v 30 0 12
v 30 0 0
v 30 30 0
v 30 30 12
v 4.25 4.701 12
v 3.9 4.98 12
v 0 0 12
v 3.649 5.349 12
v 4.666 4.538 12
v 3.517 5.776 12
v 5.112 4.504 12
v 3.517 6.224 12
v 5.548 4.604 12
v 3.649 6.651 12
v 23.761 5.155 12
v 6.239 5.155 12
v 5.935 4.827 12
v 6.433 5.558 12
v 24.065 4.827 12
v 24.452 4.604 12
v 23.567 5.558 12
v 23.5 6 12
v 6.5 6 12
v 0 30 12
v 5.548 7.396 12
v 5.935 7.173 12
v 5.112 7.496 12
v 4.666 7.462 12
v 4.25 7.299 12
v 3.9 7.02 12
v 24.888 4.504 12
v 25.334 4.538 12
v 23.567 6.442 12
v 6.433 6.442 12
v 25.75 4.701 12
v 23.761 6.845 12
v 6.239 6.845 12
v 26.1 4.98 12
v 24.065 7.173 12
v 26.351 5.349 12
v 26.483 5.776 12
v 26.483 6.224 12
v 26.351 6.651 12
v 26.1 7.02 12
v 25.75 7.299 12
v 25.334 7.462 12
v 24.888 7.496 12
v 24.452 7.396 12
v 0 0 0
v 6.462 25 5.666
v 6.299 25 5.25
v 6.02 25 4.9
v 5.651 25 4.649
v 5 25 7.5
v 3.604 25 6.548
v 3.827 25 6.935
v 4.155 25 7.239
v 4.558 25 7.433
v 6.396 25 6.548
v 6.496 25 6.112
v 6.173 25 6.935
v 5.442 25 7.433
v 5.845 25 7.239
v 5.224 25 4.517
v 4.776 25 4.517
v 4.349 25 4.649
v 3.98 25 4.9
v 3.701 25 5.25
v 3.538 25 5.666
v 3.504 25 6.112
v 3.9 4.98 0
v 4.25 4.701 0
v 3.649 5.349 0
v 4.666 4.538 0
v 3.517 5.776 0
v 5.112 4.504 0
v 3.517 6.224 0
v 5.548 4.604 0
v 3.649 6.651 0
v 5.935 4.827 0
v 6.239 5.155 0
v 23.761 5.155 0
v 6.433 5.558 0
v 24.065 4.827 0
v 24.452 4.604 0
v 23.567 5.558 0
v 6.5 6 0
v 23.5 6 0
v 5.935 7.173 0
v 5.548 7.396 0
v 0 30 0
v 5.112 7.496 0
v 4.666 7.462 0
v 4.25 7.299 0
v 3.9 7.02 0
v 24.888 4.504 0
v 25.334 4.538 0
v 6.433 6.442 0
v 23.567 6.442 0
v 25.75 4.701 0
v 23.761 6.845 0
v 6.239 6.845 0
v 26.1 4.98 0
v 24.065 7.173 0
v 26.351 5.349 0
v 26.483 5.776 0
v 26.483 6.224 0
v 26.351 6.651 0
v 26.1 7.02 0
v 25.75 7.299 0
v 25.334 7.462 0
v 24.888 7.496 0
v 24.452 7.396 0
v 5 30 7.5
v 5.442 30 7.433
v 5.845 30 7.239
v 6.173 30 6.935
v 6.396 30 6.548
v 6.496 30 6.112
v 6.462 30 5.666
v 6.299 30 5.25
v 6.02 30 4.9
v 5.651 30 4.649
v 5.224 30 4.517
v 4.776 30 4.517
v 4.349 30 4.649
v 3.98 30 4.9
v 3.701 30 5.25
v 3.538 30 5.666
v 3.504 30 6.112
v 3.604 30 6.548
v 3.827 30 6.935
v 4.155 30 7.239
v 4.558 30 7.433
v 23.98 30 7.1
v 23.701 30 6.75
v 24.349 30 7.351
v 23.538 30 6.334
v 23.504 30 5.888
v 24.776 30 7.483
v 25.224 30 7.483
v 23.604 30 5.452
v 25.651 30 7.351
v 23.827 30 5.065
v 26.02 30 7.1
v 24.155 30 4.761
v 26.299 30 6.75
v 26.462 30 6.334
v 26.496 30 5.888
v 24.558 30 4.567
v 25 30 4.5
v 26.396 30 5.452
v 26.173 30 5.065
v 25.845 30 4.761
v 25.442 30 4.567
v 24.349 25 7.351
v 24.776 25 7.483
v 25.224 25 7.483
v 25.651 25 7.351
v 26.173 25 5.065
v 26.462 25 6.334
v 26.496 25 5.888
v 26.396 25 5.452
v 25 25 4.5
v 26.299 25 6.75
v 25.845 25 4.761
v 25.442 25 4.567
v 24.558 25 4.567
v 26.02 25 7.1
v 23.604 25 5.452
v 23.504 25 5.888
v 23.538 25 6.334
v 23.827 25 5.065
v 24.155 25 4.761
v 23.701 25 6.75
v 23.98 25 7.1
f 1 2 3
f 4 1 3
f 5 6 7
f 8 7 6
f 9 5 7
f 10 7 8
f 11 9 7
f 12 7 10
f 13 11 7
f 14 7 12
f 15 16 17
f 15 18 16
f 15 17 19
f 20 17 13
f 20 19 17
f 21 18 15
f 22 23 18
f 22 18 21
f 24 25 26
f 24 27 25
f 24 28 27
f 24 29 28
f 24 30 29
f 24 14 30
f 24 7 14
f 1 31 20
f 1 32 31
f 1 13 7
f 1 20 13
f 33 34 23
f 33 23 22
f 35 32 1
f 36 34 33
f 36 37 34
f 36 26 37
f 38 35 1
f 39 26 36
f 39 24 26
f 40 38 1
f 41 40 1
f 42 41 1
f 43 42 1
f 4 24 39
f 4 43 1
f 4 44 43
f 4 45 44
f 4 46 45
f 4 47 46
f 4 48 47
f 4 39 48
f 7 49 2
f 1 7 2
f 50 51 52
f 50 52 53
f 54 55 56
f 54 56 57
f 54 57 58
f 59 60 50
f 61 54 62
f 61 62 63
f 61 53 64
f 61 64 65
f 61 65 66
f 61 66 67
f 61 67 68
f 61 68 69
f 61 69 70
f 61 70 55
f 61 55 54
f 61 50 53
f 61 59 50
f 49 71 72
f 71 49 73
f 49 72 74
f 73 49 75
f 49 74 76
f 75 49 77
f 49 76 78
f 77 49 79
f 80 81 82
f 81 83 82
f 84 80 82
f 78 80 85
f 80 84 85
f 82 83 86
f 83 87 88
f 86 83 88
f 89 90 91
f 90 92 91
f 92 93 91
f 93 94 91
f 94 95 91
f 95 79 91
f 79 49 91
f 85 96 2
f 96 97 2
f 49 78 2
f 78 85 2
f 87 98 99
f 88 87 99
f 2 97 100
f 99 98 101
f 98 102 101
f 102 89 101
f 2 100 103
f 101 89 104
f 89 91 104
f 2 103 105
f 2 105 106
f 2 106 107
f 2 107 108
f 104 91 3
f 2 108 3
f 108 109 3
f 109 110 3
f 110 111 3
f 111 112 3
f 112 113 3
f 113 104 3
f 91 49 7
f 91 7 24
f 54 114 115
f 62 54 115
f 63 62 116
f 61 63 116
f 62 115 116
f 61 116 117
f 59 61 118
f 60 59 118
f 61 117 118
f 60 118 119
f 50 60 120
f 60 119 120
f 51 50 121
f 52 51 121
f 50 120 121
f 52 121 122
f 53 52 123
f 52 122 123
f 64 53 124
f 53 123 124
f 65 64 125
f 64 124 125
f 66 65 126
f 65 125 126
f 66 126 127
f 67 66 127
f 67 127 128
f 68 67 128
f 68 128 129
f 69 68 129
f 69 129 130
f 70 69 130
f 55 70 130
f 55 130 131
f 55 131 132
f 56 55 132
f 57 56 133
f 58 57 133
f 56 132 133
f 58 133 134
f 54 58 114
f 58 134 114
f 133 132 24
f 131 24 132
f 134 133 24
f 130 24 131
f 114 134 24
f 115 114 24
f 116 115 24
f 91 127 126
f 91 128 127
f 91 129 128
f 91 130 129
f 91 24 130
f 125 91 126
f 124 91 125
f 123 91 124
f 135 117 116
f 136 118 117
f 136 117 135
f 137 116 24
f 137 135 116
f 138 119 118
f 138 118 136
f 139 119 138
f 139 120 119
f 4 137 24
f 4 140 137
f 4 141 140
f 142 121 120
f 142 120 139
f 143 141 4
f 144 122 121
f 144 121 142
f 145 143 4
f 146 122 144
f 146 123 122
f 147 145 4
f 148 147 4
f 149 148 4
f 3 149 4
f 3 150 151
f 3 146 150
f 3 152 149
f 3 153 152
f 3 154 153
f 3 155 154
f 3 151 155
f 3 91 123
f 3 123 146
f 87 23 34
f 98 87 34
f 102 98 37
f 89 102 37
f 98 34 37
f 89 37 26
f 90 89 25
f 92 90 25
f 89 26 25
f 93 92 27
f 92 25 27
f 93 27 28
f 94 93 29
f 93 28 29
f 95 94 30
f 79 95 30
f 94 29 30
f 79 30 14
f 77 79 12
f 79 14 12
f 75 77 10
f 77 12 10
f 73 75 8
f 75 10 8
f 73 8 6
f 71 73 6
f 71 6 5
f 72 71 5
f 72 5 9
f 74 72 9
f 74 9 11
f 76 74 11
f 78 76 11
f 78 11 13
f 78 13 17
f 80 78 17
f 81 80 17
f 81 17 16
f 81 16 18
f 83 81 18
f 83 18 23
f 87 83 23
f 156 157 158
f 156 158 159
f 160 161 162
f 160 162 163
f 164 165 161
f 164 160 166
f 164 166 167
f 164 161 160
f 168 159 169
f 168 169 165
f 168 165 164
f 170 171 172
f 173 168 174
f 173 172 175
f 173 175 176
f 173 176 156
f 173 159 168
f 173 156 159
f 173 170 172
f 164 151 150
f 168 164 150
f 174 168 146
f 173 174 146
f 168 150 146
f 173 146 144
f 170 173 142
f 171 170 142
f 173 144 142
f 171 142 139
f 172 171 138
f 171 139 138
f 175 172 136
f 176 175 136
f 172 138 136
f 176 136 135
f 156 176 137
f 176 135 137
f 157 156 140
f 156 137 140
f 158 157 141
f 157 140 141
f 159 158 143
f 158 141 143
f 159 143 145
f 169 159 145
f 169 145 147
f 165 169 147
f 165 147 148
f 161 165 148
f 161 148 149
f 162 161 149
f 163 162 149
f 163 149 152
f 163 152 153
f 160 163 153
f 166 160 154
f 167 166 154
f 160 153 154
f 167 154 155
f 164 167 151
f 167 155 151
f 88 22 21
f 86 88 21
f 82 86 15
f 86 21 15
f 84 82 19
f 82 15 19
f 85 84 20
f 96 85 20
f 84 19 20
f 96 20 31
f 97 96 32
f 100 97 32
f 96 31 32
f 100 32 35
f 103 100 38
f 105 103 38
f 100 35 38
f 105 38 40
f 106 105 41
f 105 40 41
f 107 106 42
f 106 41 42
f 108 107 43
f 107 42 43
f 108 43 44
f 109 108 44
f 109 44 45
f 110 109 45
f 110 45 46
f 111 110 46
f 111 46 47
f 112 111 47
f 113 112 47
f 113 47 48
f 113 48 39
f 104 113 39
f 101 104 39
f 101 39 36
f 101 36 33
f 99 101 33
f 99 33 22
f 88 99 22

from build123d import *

# Parameters (mm, degrees)
SKETCH1_W           = 30
SKETCH1_H           = 30
BOSS_EXTRUDE1_DEPTH = 12
SKETCH2_R           = 1.5
CUT_EXTRUDE1_DEPTH  = 45.09081537
SKETCH3_R           = 1.5
CUT_EXTRUDE2_DEPTH  = 5


with BuildPart() as part:
    # Sketch1 → Boss-Extrude1 (new body)
    with BuildSketch(Plane.XY):
        with Locations((15, 15)):
            Rectangle(SKETCH1_W, SKETCH1_H)
    extrude(amount=BOSS_EXTRUDE1_DEPTH)

    # Sketch2 → Cut-Extrude1 (cut, through all)
    with BuildSketch(Plane.XY.offset(12)):
        with Locations((5, 6)):
            Circle(SKETCH2_R)
        with Locations(Location((25, 6, 0), (0, 0, 180))):
            Circle(SKETCH2_R)
    extrude(amount=-CUT_EXTRUDE1_DEPTH, mode=Mode.SUBTRACT)

    # Sketch3 → Cut-Extrude2 (cut)
    with BuildSketch(Plane(origin=(0, 30, 0), x_dir=(1, 0, 0), z_dir=(0, 1, 0))):
        with Locations(Location((5, -6, 0), (0, 0, 270))):
            Circle(SKETCH3_R)
        with Locations(Location((25, -6, 0), (0, 0, 90))):
            Circle(SKETCH3_R)
    extrude(amount=-CUT_EXTRUDE2_DEPTH, mode=Mode.SUBTRACT)


solid = part.part
